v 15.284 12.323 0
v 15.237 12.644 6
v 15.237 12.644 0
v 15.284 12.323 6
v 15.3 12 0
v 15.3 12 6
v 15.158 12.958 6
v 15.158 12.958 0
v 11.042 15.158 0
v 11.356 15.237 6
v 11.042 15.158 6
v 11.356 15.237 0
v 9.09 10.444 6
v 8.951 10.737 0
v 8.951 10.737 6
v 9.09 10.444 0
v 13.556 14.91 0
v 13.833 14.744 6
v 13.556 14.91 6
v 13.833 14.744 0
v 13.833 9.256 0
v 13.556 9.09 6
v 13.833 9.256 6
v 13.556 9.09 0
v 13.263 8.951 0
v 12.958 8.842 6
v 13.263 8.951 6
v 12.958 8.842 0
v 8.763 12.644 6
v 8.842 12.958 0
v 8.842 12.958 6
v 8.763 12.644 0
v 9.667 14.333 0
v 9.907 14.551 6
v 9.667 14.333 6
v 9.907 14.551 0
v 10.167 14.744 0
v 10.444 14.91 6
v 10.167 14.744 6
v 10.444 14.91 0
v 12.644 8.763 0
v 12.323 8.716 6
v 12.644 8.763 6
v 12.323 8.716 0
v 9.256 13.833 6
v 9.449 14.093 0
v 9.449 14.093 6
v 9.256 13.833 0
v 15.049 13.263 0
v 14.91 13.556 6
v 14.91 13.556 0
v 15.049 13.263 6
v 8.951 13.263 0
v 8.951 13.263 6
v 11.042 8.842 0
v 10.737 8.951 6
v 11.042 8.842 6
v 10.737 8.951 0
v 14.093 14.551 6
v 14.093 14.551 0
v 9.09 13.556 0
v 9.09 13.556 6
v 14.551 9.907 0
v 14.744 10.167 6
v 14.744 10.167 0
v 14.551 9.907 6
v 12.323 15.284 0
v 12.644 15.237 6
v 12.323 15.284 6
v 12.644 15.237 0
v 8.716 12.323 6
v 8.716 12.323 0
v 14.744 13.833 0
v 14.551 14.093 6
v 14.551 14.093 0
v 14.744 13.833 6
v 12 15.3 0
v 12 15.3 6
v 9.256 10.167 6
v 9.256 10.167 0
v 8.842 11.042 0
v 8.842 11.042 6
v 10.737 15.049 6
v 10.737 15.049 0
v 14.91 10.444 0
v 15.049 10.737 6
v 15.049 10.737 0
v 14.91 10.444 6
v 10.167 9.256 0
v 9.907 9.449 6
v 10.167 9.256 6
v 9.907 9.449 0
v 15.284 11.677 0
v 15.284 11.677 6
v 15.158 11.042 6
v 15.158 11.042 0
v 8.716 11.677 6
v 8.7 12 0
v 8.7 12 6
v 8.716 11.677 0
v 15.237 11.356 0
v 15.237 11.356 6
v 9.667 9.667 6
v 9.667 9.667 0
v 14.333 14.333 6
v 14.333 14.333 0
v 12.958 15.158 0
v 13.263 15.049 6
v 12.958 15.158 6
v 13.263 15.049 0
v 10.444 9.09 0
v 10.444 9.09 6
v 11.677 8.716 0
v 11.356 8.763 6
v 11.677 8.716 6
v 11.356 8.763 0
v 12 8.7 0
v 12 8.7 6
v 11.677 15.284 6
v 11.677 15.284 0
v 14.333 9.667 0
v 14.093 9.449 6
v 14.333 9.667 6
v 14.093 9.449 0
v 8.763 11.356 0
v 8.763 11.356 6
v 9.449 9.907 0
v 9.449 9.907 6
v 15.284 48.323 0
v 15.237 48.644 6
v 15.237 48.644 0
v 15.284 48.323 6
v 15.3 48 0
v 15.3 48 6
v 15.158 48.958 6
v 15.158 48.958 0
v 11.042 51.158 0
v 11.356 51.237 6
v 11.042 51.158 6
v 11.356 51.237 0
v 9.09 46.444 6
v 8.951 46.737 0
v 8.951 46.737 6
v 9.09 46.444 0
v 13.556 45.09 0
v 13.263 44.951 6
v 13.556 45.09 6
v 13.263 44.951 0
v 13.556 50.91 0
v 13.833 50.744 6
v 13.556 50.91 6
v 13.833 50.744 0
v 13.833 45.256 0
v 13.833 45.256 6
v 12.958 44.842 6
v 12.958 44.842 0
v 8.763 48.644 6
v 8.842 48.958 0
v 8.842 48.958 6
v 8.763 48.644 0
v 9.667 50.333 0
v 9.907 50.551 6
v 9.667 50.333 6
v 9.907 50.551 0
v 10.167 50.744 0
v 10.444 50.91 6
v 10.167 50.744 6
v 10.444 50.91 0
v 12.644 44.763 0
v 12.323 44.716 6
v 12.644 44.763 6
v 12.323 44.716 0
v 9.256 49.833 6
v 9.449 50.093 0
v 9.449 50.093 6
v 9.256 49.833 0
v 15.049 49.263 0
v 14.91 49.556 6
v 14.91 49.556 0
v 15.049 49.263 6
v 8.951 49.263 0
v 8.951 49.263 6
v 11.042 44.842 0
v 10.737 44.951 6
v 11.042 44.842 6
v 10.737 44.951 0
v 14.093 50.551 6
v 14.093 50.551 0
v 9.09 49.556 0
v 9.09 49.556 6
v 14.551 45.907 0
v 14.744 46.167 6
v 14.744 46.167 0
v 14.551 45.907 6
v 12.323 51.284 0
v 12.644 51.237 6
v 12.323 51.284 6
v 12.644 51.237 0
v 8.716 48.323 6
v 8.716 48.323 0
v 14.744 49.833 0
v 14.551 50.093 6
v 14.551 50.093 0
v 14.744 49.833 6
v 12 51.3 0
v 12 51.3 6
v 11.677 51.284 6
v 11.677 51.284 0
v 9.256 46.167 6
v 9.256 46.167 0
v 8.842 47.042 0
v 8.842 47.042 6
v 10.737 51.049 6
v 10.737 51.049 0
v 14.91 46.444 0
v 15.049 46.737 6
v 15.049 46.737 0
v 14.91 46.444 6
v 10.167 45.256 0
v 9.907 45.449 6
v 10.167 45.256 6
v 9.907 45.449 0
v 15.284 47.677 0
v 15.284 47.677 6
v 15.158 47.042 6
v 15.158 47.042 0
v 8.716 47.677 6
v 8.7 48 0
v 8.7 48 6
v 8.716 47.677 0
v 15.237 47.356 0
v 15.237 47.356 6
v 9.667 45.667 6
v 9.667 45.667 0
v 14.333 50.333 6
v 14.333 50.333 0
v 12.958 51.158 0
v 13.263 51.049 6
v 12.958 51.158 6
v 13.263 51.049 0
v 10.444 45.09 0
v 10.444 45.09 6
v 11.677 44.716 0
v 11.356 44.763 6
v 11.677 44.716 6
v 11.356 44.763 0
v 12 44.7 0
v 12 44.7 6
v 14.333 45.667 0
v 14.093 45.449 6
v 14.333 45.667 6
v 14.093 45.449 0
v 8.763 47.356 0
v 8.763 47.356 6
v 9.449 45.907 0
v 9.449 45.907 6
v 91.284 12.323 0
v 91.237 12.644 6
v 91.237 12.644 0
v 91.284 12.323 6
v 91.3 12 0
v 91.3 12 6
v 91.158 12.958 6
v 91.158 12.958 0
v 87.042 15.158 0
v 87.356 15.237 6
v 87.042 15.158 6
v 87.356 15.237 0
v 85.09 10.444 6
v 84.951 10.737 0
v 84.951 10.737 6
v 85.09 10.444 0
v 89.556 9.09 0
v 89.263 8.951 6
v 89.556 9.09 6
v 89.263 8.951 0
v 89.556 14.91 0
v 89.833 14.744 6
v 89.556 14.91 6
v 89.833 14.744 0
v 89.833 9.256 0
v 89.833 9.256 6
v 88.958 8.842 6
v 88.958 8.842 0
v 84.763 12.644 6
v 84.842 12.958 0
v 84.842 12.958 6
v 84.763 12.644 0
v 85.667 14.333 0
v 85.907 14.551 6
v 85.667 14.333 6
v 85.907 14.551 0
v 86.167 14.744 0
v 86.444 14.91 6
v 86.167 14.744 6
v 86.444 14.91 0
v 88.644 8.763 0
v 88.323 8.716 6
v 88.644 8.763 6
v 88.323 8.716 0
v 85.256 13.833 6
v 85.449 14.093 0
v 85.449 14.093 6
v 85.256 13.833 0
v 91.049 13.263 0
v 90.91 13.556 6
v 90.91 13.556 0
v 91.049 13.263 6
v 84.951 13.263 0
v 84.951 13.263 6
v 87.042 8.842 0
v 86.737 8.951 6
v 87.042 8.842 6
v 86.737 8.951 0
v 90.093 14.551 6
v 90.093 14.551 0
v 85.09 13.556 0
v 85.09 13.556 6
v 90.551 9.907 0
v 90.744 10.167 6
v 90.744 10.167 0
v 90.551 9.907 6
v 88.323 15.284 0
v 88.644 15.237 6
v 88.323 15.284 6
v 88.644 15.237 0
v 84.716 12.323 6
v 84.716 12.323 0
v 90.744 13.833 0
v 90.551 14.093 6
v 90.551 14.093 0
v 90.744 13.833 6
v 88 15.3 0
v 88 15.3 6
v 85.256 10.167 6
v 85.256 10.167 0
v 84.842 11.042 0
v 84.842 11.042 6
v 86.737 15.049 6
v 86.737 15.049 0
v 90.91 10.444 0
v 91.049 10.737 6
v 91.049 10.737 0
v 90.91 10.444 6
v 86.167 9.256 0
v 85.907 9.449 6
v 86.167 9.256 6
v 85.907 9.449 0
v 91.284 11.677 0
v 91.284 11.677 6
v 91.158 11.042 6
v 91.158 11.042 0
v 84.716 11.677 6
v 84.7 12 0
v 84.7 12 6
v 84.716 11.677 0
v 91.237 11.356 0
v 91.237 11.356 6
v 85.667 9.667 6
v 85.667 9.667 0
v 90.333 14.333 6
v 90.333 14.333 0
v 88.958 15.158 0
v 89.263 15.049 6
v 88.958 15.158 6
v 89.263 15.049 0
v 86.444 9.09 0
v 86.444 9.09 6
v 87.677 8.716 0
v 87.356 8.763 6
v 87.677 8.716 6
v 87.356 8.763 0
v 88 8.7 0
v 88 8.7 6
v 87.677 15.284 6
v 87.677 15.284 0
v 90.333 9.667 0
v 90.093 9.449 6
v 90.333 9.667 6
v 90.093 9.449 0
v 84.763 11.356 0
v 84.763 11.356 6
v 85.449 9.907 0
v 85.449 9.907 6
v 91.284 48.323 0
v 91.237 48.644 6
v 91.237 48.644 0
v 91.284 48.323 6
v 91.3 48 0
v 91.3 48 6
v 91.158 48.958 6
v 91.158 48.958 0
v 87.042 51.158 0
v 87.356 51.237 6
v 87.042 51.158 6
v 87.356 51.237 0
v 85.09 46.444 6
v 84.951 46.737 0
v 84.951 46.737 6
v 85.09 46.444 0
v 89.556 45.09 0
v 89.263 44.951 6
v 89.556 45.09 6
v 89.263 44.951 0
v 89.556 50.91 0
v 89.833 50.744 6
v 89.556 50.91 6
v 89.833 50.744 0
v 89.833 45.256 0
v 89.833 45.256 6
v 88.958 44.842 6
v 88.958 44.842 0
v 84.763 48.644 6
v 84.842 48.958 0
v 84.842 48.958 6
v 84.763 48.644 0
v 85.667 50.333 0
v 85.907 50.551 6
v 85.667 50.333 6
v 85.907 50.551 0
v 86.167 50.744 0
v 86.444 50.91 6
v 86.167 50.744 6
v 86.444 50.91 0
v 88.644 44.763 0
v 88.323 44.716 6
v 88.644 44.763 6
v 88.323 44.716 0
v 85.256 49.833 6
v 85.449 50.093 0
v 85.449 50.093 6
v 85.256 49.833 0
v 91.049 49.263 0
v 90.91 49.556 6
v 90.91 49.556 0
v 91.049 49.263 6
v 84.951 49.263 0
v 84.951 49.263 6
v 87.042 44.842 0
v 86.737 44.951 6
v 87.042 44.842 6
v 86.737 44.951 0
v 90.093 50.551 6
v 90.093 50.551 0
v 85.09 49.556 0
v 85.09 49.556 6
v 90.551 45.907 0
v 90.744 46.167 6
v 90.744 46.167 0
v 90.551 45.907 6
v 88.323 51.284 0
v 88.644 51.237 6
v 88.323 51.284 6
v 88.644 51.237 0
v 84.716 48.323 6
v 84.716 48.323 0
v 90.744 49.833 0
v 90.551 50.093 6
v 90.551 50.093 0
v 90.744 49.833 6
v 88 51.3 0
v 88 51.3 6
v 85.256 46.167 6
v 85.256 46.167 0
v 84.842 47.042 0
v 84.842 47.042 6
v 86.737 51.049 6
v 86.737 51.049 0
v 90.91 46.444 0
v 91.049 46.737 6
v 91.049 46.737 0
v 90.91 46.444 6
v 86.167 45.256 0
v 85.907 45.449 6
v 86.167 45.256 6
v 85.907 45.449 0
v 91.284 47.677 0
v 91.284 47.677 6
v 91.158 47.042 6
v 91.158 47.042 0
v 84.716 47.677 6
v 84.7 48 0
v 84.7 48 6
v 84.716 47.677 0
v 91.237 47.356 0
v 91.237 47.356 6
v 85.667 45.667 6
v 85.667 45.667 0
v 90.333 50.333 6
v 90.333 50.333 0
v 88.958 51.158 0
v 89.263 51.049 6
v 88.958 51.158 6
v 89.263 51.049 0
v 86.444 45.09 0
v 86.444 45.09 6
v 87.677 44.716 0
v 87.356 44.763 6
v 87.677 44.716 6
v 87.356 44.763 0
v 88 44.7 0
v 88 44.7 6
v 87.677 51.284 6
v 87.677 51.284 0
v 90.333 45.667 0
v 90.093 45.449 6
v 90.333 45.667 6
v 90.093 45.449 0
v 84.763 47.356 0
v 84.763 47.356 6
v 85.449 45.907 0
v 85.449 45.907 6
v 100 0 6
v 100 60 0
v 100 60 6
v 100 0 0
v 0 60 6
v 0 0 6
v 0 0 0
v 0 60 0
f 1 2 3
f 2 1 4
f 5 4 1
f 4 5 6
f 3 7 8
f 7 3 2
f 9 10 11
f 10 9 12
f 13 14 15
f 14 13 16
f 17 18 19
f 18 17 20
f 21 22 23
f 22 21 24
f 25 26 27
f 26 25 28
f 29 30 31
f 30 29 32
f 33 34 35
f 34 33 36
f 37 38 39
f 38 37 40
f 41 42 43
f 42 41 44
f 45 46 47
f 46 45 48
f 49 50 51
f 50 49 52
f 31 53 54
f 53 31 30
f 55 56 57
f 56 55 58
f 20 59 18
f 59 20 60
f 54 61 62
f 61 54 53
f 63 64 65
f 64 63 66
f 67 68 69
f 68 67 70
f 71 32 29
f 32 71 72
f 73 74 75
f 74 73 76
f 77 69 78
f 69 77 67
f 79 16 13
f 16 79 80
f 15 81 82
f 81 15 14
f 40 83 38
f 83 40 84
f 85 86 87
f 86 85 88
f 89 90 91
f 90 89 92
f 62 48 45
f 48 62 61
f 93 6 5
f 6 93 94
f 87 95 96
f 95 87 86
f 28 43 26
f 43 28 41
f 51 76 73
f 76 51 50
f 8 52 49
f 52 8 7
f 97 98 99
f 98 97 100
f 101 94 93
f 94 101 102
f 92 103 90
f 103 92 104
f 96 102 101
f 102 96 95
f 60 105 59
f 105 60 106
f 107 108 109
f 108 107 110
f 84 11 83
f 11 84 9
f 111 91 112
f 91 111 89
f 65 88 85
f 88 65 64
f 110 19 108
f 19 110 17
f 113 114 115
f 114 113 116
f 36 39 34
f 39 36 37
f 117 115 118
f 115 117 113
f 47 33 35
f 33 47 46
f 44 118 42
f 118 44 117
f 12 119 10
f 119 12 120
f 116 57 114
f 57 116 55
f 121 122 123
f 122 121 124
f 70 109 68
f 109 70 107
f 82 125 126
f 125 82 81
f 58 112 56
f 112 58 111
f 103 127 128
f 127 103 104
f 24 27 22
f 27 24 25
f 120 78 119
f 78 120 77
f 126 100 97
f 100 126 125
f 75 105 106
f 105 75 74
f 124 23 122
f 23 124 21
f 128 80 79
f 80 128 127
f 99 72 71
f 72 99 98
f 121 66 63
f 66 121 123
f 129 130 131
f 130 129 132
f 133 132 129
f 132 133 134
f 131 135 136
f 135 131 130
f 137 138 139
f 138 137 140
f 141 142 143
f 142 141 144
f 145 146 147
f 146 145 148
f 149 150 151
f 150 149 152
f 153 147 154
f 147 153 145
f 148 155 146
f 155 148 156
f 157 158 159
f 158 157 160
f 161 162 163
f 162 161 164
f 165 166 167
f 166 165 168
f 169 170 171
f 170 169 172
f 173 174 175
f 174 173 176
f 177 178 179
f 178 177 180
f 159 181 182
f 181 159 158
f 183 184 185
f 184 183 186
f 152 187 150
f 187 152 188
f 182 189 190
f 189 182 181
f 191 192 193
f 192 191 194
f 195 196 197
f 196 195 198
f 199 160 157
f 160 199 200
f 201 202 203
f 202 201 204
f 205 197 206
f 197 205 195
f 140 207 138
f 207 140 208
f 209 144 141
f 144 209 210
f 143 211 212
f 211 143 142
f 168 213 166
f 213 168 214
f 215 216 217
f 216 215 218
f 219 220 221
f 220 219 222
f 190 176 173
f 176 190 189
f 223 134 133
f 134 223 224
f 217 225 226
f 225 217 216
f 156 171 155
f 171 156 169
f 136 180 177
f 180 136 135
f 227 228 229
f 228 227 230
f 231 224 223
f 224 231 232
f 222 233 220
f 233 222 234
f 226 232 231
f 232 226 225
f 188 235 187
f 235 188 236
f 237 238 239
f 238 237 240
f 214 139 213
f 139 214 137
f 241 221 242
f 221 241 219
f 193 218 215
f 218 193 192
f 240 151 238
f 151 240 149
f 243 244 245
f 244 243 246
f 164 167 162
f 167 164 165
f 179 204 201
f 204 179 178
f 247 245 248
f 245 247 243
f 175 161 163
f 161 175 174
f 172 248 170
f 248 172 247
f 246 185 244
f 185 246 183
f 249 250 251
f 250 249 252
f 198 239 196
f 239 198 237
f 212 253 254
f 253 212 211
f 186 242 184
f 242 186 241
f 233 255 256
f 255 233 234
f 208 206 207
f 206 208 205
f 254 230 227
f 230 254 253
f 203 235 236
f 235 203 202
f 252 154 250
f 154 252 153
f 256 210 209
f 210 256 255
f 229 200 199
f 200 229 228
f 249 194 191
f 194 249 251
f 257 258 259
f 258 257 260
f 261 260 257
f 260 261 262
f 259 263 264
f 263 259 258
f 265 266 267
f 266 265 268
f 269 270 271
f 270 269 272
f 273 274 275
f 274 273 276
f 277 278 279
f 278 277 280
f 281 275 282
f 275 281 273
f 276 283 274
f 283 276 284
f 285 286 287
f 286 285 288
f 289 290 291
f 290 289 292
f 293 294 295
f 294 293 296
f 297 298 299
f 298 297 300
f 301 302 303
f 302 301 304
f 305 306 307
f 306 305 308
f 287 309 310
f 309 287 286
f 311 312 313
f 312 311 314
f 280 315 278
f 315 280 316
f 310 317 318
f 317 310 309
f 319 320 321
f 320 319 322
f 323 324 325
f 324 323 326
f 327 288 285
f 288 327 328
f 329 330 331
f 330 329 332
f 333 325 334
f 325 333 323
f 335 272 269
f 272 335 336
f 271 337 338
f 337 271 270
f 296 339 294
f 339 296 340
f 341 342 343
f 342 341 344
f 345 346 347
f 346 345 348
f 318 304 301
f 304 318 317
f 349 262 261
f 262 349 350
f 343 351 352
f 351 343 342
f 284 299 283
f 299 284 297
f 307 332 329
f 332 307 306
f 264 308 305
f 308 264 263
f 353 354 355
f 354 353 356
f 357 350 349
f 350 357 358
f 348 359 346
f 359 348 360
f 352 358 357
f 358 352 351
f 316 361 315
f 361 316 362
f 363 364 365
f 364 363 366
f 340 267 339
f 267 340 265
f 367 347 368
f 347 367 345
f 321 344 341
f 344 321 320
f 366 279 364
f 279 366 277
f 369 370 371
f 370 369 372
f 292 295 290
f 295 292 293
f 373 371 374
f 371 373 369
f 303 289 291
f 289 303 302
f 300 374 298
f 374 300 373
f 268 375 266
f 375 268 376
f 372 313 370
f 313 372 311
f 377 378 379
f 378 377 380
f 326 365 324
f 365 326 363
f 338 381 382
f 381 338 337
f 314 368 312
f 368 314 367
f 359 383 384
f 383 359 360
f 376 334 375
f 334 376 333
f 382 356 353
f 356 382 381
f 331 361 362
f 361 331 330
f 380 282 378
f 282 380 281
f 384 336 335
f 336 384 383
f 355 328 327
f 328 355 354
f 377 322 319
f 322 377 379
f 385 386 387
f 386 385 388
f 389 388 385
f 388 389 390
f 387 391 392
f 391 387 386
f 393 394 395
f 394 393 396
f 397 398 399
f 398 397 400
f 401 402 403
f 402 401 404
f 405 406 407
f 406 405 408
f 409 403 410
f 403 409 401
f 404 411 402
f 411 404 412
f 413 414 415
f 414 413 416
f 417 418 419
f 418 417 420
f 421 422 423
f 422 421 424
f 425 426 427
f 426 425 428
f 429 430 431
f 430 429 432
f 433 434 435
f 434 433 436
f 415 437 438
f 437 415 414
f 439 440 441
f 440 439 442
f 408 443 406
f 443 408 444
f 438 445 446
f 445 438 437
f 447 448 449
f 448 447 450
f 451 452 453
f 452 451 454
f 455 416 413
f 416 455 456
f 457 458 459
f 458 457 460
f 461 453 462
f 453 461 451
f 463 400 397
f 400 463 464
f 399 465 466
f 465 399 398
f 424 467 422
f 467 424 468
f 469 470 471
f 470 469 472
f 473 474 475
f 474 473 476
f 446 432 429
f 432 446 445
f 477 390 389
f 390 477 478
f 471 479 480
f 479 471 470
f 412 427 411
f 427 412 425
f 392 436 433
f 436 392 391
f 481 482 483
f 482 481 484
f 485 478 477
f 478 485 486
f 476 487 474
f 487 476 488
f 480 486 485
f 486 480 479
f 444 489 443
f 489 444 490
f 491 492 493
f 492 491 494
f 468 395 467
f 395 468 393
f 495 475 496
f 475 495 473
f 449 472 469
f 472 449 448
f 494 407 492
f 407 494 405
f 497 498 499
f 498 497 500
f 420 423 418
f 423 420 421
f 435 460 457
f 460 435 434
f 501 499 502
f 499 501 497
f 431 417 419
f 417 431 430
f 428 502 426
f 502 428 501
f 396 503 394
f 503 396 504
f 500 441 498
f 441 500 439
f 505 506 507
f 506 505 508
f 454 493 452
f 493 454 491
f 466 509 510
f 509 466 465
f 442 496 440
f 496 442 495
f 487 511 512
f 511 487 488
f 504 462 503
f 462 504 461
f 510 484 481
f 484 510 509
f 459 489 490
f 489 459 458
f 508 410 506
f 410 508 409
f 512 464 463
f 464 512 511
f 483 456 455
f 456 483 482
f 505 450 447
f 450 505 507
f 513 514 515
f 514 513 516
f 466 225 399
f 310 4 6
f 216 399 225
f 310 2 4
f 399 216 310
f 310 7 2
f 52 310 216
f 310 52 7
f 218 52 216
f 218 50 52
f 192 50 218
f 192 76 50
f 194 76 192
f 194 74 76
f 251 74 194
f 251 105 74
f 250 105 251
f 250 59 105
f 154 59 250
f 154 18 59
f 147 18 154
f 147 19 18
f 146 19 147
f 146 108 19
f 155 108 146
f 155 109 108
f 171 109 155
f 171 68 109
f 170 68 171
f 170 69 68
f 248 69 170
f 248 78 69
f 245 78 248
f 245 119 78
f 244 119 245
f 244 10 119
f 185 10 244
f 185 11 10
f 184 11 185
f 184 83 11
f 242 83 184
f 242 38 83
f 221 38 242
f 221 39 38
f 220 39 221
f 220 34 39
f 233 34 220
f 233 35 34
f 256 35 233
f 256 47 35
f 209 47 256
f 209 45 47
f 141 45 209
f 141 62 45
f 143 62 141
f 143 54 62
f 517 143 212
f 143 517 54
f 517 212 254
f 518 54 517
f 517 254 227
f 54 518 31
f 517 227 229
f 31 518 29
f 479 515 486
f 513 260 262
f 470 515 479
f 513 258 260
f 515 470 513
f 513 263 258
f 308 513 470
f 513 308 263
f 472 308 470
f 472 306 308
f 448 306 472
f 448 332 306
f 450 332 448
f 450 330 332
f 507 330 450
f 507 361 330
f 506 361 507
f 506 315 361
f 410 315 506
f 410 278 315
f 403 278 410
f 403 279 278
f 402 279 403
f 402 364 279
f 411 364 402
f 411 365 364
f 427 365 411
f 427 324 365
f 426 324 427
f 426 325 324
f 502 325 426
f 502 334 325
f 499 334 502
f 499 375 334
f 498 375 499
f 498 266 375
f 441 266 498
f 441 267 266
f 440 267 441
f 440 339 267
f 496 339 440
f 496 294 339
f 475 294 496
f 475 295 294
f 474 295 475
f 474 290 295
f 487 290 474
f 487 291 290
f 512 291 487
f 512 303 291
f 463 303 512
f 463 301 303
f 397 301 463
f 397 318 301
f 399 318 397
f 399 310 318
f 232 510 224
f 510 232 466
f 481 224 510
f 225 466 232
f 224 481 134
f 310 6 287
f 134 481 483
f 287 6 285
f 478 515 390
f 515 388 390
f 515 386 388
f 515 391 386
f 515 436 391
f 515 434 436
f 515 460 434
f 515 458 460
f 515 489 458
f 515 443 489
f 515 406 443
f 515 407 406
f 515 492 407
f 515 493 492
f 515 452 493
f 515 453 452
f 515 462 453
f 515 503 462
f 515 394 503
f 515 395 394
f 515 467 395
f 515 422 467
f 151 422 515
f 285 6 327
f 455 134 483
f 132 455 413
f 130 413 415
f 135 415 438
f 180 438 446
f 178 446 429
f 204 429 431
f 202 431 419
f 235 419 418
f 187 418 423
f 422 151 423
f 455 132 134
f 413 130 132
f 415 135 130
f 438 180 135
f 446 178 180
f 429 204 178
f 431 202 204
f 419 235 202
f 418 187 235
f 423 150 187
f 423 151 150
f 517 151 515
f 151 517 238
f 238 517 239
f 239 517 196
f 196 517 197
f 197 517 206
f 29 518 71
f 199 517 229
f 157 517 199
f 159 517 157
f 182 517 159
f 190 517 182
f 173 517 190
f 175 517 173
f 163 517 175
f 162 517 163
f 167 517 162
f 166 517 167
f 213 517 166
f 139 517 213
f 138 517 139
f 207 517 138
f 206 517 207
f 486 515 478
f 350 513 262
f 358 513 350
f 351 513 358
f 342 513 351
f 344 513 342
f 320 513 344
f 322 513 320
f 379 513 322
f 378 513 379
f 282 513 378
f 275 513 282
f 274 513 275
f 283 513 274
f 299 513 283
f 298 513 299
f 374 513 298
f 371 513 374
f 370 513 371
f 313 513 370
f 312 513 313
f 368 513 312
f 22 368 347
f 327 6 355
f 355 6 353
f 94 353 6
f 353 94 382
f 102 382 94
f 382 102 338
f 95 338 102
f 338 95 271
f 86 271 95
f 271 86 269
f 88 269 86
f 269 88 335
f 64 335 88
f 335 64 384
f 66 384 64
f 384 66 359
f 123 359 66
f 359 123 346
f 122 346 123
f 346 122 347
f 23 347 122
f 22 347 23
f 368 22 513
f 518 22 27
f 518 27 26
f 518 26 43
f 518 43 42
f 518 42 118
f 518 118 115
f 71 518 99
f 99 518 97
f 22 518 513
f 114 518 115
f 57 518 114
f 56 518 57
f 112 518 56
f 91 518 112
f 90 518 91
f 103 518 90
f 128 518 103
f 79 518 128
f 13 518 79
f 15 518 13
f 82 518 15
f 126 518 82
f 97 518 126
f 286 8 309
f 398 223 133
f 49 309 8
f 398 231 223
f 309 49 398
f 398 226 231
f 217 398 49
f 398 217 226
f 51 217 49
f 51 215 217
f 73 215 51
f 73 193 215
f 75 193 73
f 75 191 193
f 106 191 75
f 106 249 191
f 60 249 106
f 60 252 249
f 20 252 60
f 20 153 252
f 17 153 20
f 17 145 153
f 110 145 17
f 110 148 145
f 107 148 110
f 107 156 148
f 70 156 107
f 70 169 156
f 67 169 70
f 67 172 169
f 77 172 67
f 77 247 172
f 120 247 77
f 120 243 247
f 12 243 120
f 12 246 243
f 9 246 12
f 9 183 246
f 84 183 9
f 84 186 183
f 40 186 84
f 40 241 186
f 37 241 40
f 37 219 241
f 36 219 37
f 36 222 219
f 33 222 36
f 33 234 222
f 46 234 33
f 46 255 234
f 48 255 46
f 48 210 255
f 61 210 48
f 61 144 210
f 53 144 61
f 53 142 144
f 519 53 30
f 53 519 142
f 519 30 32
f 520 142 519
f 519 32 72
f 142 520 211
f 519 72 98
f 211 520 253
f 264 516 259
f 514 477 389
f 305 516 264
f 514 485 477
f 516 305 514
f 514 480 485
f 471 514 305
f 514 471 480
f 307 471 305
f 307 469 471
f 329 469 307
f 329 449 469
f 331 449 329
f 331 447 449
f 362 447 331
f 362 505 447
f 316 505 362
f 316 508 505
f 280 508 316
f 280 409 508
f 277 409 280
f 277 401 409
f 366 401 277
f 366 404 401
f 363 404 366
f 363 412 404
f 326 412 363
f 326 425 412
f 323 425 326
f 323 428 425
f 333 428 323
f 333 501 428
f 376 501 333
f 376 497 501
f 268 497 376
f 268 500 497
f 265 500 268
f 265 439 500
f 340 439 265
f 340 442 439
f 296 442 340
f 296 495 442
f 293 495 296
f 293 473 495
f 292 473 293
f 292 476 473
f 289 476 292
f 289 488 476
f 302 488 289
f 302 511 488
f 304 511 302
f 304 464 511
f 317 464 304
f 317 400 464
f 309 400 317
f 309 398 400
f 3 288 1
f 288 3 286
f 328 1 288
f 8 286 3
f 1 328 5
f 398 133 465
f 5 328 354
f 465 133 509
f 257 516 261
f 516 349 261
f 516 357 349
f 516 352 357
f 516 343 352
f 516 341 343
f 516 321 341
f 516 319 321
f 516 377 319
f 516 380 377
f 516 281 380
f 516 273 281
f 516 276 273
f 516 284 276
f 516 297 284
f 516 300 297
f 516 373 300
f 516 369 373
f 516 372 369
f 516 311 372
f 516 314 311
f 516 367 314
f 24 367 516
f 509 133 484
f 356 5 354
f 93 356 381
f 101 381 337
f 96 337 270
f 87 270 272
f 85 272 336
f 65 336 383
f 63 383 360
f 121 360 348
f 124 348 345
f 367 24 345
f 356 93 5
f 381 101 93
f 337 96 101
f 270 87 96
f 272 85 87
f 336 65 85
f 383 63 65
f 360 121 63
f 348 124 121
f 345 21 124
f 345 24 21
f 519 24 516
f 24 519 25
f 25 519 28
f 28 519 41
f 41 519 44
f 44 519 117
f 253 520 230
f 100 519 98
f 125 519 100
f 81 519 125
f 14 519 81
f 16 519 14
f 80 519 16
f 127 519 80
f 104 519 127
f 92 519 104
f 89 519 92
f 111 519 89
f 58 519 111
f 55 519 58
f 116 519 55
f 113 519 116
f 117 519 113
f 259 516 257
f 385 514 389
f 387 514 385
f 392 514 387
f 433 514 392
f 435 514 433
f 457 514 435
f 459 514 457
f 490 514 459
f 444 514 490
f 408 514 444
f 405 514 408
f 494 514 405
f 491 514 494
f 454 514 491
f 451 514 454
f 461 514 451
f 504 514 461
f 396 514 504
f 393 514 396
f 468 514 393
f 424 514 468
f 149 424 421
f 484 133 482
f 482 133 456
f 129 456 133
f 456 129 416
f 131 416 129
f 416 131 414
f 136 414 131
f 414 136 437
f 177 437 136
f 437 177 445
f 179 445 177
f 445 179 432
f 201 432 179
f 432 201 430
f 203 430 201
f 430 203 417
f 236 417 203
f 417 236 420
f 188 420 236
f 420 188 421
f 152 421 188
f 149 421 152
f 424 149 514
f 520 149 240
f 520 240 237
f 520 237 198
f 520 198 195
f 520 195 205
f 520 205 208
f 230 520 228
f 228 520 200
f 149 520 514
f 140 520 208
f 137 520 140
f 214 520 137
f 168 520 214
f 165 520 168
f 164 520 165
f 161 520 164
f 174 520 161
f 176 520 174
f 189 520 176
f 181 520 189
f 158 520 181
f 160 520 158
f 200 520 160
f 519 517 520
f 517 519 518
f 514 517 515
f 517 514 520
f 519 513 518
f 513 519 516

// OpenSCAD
// MP-100 rev B; mm; geometry demo only
$fn=64;
difference() {
  cube([100,60,6]);
  for (x=[12,88], y=[12,48]) translate([x,y,-1]) cylinder(d=6.6,h=8);
}
